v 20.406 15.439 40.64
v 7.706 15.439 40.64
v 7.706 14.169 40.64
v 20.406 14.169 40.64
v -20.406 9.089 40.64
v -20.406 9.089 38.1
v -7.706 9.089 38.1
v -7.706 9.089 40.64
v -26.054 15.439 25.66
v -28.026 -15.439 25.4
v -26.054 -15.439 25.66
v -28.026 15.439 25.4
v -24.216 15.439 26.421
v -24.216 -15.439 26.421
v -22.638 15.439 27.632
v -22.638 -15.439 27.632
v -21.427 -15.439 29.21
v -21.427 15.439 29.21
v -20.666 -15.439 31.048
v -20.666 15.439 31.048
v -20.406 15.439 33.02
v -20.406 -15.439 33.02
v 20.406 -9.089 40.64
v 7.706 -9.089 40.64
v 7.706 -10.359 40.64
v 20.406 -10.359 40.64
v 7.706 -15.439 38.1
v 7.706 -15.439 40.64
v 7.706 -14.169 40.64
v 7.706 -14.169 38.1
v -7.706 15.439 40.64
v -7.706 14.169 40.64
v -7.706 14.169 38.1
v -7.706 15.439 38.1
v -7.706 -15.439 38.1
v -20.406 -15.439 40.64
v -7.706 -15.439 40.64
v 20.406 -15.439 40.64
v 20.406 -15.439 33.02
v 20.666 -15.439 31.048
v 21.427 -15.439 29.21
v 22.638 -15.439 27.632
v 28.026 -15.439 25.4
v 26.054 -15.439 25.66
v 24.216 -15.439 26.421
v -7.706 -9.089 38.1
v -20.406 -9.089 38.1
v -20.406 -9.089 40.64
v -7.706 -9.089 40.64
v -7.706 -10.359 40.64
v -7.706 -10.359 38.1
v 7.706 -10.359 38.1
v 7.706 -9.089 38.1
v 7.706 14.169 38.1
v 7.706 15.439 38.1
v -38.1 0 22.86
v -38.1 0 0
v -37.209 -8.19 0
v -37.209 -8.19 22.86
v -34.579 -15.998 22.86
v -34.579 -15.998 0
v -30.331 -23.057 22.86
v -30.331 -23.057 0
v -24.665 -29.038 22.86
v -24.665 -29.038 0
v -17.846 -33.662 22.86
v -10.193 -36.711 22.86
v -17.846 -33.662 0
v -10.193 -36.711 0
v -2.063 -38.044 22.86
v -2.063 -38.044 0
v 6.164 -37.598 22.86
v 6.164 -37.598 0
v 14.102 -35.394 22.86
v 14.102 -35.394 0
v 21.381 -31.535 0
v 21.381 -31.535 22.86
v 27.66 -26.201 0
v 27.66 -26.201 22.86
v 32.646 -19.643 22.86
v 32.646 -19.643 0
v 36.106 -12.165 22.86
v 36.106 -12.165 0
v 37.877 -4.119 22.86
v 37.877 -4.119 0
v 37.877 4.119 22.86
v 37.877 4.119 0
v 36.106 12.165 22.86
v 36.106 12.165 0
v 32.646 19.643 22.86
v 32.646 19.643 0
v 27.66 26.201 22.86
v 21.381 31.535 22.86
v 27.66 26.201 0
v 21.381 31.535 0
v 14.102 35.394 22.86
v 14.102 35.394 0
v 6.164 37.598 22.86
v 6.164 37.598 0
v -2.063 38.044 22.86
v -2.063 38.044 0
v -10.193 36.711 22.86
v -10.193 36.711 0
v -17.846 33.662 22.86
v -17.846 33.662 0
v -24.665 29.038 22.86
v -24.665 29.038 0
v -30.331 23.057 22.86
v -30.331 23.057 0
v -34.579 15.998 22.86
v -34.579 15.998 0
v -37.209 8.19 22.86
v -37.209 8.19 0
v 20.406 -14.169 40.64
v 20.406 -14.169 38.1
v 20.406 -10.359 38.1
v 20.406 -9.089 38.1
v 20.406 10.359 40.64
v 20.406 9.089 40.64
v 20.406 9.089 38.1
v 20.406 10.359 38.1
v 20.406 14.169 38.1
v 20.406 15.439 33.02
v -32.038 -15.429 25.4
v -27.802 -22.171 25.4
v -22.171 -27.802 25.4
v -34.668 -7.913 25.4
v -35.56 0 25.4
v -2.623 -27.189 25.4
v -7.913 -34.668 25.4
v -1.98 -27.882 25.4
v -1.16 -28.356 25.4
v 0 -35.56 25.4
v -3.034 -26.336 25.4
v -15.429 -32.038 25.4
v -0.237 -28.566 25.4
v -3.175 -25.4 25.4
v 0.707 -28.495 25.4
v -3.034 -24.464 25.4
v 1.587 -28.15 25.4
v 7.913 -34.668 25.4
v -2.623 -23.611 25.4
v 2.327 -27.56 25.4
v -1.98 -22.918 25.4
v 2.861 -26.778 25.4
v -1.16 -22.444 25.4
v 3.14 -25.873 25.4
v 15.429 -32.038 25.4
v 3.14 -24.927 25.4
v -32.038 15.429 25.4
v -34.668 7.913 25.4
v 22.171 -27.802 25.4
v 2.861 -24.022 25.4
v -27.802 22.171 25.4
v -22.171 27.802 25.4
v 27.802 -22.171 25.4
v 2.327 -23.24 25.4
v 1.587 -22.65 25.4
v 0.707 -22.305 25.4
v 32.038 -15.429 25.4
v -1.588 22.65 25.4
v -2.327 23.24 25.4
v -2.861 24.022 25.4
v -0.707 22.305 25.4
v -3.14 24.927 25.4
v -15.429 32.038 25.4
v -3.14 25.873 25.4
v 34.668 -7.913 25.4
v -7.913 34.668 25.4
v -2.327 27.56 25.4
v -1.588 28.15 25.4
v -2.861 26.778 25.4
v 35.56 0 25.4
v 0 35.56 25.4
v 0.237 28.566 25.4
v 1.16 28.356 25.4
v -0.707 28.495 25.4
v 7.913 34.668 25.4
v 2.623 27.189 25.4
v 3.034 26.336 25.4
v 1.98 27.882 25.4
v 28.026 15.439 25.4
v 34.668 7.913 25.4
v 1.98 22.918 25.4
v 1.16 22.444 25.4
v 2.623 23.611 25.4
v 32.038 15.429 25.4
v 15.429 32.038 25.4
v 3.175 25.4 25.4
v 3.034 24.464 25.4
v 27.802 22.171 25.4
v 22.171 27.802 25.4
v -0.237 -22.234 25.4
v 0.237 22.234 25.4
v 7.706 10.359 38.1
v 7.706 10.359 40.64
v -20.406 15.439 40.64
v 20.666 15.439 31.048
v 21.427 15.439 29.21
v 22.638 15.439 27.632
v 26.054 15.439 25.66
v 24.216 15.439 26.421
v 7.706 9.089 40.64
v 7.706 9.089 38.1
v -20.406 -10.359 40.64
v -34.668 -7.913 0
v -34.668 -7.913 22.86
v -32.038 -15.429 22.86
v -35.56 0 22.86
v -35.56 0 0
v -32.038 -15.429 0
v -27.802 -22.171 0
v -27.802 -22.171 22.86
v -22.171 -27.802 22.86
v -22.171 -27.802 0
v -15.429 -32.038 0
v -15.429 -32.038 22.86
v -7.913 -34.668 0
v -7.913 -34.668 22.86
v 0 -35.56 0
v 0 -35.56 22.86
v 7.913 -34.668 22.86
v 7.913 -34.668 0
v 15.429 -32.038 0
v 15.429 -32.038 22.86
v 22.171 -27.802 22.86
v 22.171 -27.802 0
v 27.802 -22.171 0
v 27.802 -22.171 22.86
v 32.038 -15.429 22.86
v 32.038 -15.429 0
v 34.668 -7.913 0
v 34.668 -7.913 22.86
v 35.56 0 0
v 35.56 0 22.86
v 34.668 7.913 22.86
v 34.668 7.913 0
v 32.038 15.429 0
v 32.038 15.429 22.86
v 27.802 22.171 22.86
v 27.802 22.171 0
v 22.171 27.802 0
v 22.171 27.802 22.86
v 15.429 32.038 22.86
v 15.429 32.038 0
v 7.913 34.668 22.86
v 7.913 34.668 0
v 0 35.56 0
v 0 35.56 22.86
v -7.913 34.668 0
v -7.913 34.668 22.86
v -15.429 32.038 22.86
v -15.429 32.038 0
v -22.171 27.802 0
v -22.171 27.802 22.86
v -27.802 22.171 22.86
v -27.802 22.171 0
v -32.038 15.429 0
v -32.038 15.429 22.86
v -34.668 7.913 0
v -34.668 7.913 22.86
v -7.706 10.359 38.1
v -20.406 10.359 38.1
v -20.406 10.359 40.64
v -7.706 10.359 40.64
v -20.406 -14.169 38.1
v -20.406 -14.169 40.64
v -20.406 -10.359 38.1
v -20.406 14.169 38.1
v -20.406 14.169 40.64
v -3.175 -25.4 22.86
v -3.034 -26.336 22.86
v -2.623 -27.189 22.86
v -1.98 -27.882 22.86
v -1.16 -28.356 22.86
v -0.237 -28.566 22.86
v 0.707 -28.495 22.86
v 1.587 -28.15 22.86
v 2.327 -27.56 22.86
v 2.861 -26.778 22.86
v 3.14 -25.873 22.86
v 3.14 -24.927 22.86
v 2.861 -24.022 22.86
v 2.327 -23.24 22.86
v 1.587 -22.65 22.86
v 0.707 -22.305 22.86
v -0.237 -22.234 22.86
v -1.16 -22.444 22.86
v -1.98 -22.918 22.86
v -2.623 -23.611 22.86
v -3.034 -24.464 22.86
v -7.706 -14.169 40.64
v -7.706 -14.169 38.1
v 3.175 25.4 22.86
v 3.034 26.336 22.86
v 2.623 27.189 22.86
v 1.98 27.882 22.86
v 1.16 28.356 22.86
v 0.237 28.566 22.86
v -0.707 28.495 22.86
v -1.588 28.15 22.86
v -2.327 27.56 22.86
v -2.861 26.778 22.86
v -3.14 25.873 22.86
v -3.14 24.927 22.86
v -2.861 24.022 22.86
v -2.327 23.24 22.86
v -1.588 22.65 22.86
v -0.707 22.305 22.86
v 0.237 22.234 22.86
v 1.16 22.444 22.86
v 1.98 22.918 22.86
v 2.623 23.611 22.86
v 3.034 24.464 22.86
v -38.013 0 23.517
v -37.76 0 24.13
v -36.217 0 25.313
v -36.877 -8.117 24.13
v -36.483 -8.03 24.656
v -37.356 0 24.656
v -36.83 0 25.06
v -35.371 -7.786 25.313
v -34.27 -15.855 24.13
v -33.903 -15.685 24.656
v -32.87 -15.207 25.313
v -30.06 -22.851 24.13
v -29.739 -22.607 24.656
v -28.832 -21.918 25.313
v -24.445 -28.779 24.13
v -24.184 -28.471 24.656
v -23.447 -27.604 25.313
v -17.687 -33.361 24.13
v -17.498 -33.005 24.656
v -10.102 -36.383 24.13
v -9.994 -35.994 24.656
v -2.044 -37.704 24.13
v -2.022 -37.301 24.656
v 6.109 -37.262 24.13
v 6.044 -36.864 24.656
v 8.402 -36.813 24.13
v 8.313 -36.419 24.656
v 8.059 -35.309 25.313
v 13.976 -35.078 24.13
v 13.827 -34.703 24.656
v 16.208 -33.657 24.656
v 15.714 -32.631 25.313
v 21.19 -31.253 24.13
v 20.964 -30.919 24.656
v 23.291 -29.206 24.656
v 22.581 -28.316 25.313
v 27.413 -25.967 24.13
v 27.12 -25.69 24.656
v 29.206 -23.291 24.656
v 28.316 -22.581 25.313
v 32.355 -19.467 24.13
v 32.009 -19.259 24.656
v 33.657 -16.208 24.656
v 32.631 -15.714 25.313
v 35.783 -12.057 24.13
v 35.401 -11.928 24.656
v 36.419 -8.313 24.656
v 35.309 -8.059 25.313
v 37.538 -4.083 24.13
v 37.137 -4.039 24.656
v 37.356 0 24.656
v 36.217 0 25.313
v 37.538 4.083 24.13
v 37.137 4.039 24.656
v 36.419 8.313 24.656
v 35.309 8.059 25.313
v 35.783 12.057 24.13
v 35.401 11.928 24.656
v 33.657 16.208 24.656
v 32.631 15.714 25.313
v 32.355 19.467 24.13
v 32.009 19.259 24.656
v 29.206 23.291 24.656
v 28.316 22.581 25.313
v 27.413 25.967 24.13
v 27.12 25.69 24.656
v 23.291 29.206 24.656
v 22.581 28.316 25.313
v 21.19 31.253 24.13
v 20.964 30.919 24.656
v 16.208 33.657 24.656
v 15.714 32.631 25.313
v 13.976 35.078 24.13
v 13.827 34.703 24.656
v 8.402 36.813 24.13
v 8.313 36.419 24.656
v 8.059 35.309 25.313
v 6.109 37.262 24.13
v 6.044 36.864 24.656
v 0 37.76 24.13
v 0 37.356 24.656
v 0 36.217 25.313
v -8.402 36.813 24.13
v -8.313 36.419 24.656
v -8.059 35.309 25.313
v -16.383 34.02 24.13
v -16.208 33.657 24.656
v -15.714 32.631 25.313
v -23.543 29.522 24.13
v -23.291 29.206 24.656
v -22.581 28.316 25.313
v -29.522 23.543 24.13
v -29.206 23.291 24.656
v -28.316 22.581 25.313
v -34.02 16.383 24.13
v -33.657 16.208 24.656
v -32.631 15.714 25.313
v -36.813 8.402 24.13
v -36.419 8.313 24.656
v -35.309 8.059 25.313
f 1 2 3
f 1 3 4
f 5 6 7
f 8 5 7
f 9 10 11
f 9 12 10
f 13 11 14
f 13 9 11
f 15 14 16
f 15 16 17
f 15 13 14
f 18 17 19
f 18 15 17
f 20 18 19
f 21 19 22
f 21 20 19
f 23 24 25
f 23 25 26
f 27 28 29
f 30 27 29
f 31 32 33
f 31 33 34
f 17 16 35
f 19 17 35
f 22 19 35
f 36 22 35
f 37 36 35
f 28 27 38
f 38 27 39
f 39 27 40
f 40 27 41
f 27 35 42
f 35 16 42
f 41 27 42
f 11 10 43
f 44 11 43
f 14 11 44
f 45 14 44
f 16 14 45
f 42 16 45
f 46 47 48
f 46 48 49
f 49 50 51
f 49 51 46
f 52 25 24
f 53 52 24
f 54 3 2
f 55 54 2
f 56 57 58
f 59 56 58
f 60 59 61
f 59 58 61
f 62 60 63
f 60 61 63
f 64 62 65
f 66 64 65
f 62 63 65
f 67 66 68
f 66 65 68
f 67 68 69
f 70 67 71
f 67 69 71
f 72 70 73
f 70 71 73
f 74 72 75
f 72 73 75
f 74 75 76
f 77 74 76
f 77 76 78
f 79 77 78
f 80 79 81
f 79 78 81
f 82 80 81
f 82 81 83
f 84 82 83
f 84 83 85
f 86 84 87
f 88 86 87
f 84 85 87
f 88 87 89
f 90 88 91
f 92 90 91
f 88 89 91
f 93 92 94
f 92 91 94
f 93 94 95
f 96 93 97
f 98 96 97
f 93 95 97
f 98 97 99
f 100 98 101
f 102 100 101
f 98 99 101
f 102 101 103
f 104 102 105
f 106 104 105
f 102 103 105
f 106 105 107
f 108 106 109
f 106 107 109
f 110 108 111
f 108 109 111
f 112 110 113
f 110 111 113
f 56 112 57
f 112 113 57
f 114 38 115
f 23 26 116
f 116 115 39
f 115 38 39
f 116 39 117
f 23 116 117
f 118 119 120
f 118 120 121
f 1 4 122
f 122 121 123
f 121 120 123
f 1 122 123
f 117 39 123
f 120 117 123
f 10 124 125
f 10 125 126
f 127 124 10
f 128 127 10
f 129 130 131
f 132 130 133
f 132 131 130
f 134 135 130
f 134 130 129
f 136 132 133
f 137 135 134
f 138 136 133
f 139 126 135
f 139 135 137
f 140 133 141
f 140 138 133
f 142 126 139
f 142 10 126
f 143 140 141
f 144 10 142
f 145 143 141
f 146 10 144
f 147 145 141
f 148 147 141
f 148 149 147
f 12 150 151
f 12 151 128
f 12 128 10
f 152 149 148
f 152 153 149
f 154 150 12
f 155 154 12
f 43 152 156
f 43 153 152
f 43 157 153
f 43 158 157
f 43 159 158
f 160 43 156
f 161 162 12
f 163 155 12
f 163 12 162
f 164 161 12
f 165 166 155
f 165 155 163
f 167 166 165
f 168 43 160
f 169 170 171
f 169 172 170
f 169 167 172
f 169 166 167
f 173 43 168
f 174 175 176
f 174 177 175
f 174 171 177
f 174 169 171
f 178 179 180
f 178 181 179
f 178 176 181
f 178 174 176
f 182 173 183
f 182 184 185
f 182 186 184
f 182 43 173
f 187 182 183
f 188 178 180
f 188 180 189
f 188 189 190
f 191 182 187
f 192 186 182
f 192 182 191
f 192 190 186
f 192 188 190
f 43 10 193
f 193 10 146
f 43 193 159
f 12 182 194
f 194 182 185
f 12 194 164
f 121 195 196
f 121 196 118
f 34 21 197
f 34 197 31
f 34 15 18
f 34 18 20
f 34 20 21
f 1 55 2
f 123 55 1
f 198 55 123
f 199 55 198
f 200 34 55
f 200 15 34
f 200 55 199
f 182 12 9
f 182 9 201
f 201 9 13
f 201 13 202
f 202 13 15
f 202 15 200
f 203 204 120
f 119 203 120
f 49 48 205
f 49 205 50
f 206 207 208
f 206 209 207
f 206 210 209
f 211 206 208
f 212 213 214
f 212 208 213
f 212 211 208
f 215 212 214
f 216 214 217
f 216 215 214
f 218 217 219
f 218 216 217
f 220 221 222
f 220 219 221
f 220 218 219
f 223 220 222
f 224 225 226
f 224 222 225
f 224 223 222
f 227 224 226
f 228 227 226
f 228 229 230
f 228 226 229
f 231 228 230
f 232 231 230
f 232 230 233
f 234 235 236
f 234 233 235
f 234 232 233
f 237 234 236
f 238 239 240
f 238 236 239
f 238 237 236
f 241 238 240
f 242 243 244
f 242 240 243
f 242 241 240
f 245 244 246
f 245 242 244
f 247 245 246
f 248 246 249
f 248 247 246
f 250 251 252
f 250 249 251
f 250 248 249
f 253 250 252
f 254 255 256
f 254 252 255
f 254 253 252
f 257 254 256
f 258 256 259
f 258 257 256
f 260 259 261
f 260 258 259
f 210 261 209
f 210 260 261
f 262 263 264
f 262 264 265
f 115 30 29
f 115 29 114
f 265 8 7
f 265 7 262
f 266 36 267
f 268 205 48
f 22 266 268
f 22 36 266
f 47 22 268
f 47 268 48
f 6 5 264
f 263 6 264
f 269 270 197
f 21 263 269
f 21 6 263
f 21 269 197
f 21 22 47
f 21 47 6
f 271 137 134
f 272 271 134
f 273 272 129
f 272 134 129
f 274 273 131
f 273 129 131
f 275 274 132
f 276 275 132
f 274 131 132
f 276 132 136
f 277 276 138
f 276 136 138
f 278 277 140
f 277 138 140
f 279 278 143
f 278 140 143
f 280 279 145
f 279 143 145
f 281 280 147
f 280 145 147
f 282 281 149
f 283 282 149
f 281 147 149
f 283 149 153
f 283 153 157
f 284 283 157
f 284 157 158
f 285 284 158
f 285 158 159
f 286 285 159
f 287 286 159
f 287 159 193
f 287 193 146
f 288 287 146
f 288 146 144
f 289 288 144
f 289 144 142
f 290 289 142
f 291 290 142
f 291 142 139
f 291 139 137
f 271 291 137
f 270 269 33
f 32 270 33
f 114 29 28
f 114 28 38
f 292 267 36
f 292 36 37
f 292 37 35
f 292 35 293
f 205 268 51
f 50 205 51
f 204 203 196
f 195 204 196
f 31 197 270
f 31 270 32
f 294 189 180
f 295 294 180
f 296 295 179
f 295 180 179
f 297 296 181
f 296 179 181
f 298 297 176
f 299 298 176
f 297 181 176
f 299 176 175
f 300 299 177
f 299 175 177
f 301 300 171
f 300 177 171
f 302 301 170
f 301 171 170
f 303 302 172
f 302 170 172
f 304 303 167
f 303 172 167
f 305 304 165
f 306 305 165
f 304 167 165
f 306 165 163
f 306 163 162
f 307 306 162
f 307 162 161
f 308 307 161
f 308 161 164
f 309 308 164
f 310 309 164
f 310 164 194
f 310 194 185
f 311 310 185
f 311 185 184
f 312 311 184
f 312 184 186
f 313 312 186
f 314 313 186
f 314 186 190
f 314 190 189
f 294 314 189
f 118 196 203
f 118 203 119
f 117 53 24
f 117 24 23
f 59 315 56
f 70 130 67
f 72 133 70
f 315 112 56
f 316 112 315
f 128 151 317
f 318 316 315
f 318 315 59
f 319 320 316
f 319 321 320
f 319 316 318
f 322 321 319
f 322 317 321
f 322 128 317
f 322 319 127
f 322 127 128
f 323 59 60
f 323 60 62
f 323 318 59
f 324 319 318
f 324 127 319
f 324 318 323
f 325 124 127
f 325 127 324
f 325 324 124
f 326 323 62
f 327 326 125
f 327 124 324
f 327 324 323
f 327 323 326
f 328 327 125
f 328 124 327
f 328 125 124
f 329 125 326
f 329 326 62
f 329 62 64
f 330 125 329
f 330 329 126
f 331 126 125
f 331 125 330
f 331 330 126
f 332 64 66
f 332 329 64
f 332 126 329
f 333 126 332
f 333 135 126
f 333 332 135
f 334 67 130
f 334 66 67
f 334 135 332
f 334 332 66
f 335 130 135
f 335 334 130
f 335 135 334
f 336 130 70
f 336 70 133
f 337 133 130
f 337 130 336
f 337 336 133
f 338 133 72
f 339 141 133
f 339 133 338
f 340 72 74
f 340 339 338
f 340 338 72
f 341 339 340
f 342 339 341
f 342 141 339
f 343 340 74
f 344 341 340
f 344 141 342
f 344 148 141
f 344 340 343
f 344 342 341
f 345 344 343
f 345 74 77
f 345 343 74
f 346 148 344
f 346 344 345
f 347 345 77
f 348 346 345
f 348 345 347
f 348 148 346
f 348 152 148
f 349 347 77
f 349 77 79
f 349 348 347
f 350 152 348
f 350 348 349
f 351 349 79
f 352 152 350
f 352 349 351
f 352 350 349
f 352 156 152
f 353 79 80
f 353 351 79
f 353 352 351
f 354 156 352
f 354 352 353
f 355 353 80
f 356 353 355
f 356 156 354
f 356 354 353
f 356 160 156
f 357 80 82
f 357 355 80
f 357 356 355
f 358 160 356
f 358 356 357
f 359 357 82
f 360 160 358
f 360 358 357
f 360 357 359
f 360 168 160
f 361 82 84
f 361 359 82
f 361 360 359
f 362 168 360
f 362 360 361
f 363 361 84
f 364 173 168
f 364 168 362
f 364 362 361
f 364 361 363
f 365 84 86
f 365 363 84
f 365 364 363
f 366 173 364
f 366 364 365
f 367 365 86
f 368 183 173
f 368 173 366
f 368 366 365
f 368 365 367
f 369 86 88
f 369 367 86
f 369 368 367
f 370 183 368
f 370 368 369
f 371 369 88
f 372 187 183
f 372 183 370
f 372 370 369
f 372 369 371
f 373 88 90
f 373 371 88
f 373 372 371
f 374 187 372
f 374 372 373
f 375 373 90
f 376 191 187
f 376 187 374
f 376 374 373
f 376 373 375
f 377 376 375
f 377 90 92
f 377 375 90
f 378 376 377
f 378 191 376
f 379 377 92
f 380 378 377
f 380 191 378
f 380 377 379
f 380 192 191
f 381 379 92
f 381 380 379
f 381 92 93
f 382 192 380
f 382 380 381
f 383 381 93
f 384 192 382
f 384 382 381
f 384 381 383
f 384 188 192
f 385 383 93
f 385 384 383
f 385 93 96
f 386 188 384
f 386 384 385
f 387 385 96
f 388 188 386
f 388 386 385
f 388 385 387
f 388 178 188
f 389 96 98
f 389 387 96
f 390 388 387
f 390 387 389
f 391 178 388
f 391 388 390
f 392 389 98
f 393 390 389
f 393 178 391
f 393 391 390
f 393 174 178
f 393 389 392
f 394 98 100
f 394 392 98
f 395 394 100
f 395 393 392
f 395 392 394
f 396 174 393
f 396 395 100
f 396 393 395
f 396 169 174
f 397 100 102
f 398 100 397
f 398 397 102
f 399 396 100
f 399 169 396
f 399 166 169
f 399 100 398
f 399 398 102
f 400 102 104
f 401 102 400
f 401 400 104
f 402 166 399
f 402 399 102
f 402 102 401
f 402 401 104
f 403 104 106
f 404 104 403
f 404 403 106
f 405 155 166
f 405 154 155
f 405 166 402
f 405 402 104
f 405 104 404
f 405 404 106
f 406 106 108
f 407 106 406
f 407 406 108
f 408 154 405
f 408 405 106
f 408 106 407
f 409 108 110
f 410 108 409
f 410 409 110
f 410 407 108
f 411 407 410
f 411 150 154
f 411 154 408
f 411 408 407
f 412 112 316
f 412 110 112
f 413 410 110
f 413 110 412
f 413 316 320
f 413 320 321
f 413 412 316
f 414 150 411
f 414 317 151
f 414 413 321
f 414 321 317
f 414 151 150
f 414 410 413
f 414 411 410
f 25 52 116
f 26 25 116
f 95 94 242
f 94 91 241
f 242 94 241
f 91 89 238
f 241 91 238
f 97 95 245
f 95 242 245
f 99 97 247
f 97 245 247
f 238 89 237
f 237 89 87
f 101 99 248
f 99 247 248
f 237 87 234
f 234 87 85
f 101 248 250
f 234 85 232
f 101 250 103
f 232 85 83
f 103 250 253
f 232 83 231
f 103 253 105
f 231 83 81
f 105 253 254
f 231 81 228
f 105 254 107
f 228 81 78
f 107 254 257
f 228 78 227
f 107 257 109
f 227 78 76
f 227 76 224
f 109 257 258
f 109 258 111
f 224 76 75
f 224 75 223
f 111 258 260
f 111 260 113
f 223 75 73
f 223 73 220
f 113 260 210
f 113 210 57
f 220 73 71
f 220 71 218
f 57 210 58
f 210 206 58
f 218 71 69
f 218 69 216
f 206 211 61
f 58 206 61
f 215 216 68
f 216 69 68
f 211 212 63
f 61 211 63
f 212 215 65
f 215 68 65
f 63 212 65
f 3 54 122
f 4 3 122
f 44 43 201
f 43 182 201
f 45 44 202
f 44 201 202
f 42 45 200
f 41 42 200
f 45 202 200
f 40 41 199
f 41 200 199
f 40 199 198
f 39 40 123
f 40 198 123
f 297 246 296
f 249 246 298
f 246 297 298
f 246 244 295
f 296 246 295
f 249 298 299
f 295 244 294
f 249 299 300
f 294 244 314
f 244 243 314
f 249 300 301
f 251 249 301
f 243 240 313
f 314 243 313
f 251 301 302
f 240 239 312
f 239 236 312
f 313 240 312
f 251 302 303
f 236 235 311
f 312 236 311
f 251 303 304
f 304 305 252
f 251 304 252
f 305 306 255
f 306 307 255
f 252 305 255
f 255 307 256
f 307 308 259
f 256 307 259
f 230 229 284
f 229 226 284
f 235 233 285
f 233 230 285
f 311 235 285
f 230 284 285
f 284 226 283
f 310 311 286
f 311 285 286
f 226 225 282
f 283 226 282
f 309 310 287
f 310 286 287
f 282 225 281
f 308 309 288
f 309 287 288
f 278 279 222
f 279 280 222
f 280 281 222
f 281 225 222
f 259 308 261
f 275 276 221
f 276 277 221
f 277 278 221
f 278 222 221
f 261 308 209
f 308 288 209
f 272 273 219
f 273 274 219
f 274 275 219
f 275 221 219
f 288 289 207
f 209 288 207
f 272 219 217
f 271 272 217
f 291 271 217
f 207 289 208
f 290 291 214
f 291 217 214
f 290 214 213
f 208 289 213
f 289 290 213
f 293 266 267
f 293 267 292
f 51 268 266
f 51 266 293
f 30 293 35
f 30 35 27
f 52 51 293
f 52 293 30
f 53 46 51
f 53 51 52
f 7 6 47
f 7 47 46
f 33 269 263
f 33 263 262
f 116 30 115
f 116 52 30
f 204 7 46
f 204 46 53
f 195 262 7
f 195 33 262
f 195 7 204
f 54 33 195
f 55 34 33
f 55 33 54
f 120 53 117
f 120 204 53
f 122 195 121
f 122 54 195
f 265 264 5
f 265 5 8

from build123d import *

# Parameters (mm, degrees)
SKETCH1_R           = 38.1
BOSS_EXTRUDE1_DEPTH = 25.4
SHELL1_T            = -2.54
FILLET1_R           = 2.54
SKETCH2_R           = 3.175
CUT_EXTRUDE1_DEPTH  = 60.568280214
CIRPATTERN1_COUNT   = 4
SKETCH3_W           = 40.812489524
SKETCH3_H           = 30.878008928
BOSS_EXTRUDE2_DEPTH = 12.7
SKETCH6_R           = 3.175
BOSS_EXTRUDE4_DEPTH = 2.54
FILLET3_R           = 7.62
SKETCH8_W           = 40.812489524
SKETCH8_H           = 1.27
BOSS_EXTRUDE7_DEPTH = 2.54
SKETCH9_W           = 15.412489524
SKETCH9_H           = 30.878008928
CUT_EXTRUDE2_DEPTH  = 2.54


with BuildPart() as part:
    # Sketch1 → Boss-Extrude1 (new body)
    with BuildSketch(Plane.XY):
        with Locations(Location((0, 0, 0), (0, 0, 180))):
            Circle(SKETCH1_R)
    extrude(amount=BOSS_EXTRUDE1_DEPTH)

    # Shell1
    shell1_openings = [part.faces().sort_by_distance(p)[0] for p in [
        (0, 0, 0),
    ]]
    offset(amount=SHELL1_T, openings=shell1_openings, kind=Kind.INTERSECTION)

    # Fillet1
    fillet1_edges = [part.edges().sort_by_distance(p)[0] for p in [
        (38.1, 0, 25.4),
    ]]
    fillet(fillet1_edges, radius=FILLET1_R)

    # Sketch2 → Cut-Extrude1 (cut, through all)
    with BuildSketch(Plane.XY.offset(25.4)):
        with Locations((0, 25.4)):
            Circle(SKETCH2_R)
    cut_extrude1 = extrude(amount=-CUT_EXTRUDE1_DEPTH, mode=Mode.SUBTRACT)

    # CirPattern1: Cut-Extrude1 ×4 about axis
    cirpattern1_axis = Axis((0, 0, 0), (0, 0, 1))
    for i in range(1, CIRPATTERN1_COUNT):
        add(cut_extrude1.rotate(cirpattern1_axis, i * 360 / CIRPATTERN1_COUNT), mode=Mode.SUBTRACT)

    # Sketch3 → Boss-Extrude2 (add)
    with BuildSketch(Plane.XY.offset(25.4)):
        Rectangle(SKETCH3_W, SKETCH3_H)
    extrude(amount=BOSS_EXTRUDE2_DEPTH)

    # Sketch6 → Boss-Extrude4 (add)
    with BuildSketch(Plane.XY.offset(25.4)):
        with Locations((25.4, 0)):
            Circle(SKETCH6_R)
        with Locations((-25.4, 0)):
            Circle(SKETCH6_R)
    extrude(amount=-BOSS_EXTRUDE4_DEPTH)

    # Fillet3
    fillet3_edges = [part.edges().sort_by_distance(p)[0] for p in [
        (20.406244762, 0, 25.4),
        (-20.406244762, 0, 25.4),
    ]]
    fillet(fillet3_edges, radius=FILLET3_R)

    # Sketch8 → Boss-Extrude7 (add)
    with BuildSketch(Plane.XY.offset(38.1)):
        with Locations((0, 14.804004464)):
            Rectangle(SKETCH8_W, SKETCH8_H)
        with Locations((0, 9.724004464)):
            Rectangle(SKETCH8_W, SKETCH8_H)
        with Locations((0, -9.724004464)):
            Rectangle(SKETCH8_W, SKETCH8_H)
        with Locations((0, -14.804004464)):
            Rectangle(SKETCH8_W, SKETCH8_H)
    extrude(amount=BOSS_EXTRUDE7_DEPTH)

    # Sketch9 → Cut-Extrude2 (cut)
    with BuildSketch(Plane.XY.offset(40.64)):
        Rectangle(SKETCH9_W, SKETCH9_H)
    extrude(amount=-CUT_EXTRUDE2_DEPTH, mode=Mode.SUBTRACT)


solid = part.part
